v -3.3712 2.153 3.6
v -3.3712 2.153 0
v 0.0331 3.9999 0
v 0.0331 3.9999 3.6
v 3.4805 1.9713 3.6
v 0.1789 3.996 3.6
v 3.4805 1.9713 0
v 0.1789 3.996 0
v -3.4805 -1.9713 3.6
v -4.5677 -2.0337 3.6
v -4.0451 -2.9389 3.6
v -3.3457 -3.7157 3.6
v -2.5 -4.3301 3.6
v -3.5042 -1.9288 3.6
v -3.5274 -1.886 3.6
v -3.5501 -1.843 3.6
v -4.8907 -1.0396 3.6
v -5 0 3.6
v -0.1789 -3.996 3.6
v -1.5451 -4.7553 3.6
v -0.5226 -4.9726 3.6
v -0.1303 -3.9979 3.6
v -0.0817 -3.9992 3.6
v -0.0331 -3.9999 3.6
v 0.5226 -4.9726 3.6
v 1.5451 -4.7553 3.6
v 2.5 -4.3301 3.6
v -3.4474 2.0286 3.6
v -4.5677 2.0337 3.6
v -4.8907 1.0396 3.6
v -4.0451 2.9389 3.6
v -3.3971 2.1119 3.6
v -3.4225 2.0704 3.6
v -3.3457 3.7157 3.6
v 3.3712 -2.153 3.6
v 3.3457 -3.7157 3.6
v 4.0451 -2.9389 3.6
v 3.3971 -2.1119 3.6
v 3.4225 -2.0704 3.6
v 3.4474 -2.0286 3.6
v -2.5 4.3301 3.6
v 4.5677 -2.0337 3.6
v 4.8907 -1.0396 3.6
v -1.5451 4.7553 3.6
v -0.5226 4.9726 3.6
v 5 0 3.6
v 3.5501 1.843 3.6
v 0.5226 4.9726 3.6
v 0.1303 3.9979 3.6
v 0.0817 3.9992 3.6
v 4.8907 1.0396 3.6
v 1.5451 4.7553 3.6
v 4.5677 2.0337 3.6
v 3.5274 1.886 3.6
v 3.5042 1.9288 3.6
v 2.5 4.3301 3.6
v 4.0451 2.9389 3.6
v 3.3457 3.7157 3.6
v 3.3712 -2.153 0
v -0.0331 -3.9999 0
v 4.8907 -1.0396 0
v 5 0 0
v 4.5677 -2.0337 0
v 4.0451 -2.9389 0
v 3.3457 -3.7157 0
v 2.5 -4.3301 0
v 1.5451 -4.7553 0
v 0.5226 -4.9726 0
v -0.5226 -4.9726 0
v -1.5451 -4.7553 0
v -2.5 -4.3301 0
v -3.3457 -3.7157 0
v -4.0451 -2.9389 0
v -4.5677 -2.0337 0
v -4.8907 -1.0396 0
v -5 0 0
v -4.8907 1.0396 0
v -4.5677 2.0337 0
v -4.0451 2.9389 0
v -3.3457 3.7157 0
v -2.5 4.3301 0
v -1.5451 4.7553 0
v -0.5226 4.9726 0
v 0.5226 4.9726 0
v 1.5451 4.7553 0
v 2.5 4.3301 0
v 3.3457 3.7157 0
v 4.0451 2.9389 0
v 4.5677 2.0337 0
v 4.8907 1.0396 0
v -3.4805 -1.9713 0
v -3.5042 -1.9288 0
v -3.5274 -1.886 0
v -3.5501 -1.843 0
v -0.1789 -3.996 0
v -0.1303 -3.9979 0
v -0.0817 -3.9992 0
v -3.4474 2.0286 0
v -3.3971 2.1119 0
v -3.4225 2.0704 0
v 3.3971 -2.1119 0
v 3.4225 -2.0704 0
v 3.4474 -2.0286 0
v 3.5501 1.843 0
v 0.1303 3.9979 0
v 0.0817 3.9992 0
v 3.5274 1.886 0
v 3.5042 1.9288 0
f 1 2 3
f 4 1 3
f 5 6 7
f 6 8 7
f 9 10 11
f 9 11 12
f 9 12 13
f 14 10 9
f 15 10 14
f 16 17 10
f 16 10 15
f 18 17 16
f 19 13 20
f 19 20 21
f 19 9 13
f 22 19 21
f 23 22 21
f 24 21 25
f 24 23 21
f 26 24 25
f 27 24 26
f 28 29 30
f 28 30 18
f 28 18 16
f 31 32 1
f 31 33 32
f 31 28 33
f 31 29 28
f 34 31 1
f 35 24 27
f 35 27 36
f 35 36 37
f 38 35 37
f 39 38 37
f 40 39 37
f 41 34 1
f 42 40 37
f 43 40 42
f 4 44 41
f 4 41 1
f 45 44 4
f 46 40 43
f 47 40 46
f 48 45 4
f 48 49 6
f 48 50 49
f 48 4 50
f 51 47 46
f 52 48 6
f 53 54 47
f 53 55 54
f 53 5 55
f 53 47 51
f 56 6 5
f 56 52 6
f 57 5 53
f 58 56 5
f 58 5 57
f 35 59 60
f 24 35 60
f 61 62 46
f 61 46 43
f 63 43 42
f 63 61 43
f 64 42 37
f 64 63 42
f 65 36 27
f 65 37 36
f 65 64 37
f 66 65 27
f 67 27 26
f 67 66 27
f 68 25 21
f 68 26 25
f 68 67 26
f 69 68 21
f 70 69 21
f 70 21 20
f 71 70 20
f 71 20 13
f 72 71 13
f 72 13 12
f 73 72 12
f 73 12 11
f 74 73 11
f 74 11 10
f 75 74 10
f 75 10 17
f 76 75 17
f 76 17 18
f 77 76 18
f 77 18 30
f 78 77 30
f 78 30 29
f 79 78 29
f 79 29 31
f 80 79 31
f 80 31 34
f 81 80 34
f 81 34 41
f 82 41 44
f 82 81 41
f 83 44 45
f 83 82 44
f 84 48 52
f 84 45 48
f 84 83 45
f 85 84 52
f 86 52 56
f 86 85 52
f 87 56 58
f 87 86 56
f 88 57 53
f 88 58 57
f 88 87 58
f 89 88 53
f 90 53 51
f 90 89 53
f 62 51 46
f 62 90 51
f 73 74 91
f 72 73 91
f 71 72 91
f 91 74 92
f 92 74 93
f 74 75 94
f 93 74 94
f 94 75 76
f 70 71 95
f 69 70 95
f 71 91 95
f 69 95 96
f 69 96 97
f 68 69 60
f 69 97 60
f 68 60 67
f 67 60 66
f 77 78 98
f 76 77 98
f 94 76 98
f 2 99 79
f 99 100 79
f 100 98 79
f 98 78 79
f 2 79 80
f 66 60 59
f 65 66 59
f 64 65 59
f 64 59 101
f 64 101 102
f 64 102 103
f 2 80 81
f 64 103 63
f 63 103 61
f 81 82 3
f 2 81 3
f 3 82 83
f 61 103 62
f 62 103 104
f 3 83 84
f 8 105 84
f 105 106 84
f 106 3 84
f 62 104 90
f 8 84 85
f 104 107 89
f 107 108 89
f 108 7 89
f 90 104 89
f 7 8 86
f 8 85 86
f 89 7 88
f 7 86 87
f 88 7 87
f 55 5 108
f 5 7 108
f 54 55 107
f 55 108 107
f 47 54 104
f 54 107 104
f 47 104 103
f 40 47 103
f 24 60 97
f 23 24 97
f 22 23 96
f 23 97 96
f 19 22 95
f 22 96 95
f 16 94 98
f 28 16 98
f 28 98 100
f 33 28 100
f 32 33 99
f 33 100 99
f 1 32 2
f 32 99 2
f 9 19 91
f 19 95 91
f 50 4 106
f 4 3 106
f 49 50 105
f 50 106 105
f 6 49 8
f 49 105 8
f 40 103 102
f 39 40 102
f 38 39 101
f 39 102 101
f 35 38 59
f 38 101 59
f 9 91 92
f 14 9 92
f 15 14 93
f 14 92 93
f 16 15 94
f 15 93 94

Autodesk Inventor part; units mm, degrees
ref_plane "YZ Plane" through (0, 0, 0) normal (1, 0, 0) x (0, 1, 0)
ref_plane "XZ Plane" through (0, 0, 0) normal (0, 1, 0) x (-1, 0, 0)
sketch "Sketch1" plane through (0, 0, 0) normal (0, 0, 1) x (1, 0, 0)
  circle A0 centre (0, 0) radius 1.525
  line L0 (3.3712, -2.153) -> (-0.0331, -3.9999)
  arc A1 (-0.1789, -3.996) -> (-0.0331, -3.9999) centre (0, 0) ccw
  line L1 (-0.1789, -3.996) -> (-3.4805, -1.9713)
  arc A2 (-3.5501, -1.843) -> (-3.4805, -1.9713) centre (0, 0) ccw
  line L2 (-3.5501, -1.843) -> (-3.4474, 2.0286)
  arc A3 (-3.3712, 2.153) -> (-3.4474, 2.0286) centre (0, 0) ccw
  line L3 (-3.3712, 2.153) -> (0.0331, 3.9999)
  arc A4 (0.1789, 3.996) -> (0.0331, 3.9999) centre (0, 0) ccw
  line L4 (0.1789, 3.996) -> (3.4805, 1.9713)
  arc A5 (3.5501, 1.843) -> (3.4805, 1.9713) centre (0, 0) ccw
  line L5 (3.5501, 1.843) -> (3.4474, -2.0286)
  arc A6 (3.3712, -2.153) -> (3.4474, -2.0286) centre (0, 0) ccw
  circle A7 centre (0, 0) radius 5
  point P0 (0, 0)
  dimension "d0" = 10
ref_plane "Work Plane1" through (-10.187, -10.187, 3.6) normal (0, 0, -1) x (0.5228, 0.8525, 0)
extrude "Extrusion1" add sketch "Sketch1" along normal up to surface (3.6 mm away) contours A7
properties part number "Servo_Spacer"
